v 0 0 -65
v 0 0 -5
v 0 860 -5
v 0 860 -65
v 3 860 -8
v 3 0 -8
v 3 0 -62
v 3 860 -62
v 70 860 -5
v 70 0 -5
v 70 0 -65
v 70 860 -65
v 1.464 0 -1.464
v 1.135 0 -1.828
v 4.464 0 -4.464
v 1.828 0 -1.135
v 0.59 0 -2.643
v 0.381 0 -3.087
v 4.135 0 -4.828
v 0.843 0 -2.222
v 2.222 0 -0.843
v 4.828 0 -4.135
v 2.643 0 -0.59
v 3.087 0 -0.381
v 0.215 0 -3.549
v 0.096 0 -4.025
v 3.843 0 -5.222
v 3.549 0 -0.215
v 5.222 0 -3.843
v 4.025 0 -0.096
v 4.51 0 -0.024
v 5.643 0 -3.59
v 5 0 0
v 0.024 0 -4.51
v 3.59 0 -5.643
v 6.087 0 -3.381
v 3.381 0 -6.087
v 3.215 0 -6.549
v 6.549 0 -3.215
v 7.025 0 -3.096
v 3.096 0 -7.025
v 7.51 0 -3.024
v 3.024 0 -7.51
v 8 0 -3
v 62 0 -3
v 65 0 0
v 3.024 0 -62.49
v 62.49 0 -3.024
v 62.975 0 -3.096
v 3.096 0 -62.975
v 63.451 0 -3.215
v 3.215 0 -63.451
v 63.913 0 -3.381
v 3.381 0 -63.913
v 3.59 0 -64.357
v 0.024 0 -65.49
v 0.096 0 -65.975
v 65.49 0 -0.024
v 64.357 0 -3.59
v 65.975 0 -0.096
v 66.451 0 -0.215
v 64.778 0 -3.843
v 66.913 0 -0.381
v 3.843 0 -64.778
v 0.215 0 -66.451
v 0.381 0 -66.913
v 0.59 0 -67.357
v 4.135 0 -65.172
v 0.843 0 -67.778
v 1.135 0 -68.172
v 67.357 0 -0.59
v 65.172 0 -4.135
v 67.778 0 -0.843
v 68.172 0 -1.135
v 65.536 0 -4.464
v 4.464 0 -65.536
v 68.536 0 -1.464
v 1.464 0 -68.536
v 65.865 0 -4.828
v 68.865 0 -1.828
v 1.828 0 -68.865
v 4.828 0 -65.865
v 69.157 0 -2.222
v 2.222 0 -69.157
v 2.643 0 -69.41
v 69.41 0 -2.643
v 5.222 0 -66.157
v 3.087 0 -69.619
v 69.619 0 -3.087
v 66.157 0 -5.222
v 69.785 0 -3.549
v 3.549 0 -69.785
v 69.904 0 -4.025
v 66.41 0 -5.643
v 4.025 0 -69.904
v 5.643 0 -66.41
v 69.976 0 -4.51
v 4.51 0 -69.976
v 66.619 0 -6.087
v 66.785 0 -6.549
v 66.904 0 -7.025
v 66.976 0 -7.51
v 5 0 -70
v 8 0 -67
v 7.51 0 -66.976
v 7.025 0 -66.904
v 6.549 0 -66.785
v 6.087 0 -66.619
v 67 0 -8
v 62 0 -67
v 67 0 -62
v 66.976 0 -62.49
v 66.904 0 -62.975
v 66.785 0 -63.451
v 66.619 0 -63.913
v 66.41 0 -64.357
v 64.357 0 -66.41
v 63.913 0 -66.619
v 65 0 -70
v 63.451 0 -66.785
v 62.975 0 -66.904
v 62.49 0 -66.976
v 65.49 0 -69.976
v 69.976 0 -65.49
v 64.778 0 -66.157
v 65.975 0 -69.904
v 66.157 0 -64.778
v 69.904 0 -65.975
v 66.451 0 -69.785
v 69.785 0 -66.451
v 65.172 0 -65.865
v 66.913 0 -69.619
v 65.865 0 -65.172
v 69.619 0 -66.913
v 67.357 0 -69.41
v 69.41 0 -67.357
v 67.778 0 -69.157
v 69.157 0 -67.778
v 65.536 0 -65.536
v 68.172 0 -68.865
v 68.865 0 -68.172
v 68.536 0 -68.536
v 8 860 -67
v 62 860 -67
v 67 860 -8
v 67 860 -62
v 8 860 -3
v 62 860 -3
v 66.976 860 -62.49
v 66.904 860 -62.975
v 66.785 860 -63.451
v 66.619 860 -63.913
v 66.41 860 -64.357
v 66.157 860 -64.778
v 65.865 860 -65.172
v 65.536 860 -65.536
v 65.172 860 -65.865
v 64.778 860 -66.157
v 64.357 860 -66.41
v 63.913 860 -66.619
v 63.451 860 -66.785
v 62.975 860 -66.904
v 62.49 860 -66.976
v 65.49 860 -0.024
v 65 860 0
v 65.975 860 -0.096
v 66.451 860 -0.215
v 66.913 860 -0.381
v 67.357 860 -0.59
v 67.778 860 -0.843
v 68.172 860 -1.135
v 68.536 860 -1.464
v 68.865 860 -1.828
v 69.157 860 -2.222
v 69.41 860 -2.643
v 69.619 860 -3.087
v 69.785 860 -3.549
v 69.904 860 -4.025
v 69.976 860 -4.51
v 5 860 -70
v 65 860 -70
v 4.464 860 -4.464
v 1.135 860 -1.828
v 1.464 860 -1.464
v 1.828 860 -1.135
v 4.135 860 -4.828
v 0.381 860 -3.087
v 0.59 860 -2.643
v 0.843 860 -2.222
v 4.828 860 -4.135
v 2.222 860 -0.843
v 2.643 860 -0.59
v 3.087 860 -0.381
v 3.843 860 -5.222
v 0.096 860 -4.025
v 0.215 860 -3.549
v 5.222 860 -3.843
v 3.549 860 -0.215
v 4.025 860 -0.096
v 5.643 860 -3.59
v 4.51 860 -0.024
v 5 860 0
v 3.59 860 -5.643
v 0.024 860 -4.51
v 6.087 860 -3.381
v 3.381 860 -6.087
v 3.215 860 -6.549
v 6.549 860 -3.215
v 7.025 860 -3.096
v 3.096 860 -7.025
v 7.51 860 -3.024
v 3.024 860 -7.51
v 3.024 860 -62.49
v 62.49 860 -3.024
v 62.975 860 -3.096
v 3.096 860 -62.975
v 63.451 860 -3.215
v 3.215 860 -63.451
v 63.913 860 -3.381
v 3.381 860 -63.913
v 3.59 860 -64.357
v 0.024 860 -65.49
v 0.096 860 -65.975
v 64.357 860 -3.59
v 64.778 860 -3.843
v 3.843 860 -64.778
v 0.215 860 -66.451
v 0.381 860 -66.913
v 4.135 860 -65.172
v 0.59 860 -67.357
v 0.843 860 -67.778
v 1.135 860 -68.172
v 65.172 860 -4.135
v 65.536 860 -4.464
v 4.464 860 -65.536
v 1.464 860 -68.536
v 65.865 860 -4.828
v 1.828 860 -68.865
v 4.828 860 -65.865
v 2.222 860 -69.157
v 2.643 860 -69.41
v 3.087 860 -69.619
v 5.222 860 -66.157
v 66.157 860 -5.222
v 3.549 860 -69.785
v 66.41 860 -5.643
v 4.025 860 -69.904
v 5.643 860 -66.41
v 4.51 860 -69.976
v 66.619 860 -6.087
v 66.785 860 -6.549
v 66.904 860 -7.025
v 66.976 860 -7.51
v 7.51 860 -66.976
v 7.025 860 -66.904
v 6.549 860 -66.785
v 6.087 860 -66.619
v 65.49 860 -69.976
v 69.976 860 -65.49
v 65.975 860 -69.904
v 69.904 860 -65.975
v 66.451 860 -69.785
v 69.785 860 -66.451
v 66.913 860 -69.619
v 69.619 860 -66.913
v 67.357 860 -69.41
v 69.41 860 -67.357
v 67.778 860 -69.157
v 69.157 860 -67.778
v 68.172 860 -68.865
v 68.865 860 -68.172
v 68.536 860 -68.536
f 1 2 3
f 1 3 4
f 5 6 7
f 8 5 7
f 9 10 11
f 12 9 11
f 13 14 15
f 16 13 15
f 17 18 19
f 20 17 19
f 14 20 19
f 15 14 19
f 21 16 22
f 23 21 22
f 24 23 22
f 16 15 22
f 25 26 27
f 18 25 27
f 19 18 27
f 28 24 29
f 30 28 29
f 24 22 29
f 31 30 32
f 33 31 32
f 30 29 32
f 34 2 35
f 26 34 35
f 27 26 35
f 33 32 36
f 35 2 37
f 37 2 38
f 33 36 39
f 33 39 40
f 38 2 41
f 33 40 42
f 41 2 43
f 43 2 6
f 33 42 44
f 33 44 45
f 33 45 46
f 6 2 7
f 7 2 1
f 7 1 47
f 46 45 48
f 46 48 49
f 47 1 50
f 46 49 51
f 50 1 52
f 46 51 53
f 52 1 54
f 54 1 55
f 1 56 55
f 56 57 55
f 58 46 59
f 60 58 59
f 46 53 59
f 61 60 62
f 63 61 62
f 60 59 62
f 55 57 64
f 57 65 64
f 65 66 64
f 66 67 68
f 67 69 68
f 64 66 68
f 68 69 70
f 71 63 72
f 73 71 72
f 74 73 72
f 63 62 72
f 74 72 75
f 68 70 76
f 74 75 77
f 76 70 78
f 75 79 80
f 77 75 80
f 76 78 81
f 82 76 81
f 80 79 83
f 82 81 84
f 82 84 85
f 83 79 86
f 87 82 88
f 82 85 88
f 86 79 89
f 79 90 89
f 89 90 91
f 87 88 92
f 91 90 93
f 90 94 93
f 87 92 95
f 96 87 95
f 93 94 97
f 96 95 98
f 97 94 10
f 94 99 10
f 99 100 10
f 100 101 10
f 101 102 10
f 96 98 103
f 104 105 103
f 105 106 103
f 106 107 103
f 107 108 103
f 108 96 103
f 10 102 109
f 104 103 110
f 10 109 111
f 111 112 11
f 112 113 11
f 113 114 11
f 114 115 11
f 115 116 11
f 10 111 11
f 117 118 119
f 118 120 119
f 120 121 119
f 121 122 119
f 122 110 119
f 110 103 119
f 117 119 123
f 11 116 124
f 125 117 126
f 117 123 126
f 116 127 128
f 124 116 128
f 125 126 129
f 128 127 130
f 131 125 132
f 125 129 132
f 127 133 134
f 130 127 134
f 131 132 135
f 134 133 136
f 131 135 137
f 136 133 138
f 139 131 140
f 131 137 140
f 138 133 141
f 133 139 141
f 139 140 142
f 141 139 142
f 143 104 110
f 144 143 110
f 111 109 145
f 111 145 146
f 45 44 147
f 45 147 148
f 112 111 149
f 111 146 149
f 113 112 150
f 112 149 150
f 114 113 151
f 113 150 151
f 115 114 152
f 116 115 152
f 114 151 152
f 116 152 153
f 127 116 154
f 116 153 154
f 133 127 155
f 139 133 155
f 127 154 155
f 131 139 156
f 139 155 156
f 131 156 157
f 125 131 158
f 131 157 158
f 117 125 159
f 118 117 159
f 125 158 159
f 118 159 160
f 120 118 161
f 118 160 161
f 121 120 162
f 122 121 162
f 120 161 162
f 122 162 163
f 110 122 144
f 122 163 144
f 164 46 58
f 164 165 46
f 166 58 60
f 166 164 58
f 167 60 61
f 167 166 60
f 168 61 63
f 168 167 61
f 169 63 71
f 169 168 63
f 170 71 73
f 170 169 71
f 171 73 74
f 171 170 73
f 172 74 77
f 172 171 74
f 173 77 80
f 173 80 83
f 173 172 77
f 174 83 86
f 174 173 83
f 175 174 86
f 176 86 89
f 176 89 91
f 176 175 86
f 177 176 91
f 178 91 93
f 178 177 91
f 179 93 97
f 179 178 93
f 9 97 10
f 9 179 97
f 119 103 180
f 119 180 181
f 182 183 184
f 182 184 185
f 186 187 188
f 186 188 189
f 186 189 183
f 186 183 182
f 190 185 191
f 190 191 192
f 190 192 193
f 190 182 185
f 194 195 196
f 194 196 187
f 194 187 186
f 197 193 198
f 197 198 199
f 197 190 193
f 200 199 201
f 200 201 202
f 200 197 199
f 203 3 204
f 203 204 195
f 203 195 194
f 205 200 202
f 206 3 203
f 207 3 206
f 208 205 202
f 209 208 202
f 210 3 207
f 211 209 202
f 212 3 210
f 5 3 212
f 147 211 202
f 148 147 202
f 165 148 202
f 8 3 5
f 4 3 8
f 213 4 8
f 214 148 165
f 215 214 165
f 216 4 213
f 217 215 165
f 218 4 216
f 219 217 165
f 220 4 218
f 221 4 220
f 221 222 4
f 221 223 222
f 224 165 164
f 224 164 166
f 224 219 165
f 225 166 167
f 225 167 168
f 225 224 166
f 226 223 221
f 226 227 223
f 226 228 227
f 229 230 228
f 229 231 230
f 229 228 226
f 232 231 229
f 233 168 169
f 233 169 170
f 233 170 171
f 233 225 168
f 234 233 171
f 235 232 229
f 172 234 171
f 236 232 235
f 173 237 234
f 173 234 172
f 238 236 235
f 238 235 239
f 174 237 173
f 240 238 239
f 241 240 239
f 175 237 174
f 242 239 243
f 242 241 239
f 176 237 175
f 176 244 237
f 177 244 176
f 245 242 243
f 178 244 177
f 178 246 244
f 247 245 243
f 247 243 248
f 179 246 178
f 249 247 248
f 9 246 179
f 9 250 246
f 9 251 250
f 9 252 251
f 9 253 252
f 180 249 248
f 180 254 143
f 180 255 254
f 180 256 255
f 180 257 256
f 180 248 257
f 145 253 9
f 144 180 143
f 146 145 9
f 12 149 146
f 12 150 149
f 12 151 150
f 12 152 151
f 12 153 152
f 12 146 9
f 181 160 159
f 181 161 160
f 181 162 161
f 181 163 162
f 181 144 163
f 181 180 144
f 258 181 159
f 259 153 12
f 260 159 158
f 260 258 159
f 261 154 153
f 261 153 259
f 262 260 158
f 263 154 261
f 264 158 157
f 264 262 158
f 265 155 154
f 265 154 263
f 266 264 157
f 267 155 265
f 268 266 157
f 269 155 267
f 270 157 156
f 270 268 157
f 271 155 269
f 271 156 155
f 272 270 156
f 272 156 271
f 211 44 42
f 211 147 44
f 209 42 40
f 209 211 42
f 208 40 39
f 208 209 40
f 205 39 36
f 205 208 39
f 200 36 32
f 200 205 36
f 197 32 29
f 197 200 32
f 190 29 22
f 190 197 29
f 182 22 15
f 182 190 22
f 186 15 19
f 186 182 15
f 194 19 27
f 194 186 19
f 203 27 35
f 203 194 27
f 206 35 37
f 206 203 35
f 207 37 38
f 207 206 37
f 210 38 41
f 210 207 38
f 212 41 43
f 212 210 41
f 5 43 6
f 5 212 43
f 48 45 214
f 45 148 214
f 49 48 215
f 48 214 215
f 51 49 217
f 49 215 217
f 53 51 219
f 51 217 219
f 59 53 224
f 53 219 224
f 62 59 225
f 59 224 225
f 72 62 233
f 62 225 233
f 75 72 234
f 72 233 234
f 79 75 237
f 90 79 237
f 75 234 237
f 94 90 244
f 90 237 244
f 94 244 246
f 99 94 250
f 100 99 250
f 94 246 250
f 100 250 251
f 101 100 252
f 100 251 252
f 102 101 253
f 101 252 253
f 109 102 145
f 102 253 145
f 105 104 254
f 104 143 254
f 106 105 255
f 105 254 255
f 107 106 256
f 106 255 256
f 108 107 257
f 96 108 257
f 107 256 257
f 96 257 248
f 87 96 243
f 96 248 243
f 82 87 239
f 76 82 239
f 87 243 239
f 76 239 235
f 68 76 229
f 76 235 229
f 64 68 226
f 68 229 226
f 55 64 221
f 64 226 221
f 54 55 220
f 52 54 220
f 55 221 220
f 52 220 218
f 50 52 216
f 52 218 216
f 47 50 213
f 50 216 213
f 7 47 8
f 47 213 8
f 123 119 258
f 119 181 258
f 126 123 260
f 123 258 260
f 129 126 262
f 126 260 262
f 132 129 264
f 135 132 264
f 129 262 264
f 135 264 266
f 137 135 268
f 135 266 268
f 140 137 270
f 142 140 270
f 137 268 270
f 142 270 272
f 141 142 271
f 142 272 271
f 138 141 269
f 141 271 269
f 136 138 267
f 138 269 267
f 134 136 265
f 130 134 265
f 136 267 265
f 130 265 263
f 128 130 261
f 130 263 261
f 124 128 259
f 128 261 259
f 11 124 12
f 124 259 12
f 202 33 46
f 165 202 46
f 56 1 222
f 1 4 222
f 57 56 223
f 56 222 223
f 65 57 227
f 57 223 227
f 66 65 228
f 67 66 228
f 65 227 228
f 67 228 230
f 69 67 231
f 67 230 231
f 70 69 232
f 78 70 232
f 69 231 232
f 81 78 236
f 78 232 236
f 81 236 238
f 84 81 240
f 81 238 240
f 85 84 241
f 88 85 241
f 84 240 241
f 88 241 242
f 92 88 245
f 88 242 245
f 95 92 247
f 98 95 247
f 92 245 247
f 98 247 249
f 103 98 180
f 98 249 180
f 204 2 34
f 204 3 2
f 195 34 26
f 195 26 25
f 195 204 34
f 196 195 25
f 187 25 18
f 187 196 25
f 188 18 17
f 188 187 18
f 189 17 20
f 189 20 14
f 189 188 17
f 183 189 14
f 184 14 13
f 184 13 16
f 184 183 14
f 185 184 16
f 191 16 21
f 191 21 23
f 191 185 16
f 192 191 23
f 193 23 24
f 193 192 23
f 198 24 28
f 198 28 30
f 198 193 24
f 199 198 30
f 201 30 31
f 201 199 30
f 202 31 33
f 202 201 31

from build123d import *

# Parameters (mm, degrees)
SKETCH1_W           = 70
SKETCH1_H           = 70
SKETCH1_W_2         = 64
SKETCH1_H_2         = 64
BOSS_EXTRUDE1_DEPTH = 860
FILLET1_R           = 5


with BuildPart() as part:
    # Sketch1 → Boss-Extrude1 (new body)
    with BuildSketch(Plane(origin=(0, 0, 0), x_dir=(1, 0, 0), z_dir=(0, 1, 0))):
        with Locations((35, 35)):
            Rectangle(SKETCH1_W, SKETCH1_H)
        with Locations((35, 35)):
            Rectangle(SKETCH1_W_2, SKETCH1_H_2, mode=Mode.SUBTRACT)
    extrude(amount=BOSS_EXTRUDE1_DEPTH)

    # Fillet1
    fillet1_edges = [part.edges().sort_by_distance(p)[0] for p in [
        (3, 430, -67),
        (3, 430, -3),
        (67, 430, -3),
        (67, 430, -67),
        (0, 430, 0),
        (0, 430, -70),
        (70, 430, -70),
        (70, 430, 0),
    ]]
    fillet(fillet1_edges, radius=FILLET1_R)


solid = part.part
